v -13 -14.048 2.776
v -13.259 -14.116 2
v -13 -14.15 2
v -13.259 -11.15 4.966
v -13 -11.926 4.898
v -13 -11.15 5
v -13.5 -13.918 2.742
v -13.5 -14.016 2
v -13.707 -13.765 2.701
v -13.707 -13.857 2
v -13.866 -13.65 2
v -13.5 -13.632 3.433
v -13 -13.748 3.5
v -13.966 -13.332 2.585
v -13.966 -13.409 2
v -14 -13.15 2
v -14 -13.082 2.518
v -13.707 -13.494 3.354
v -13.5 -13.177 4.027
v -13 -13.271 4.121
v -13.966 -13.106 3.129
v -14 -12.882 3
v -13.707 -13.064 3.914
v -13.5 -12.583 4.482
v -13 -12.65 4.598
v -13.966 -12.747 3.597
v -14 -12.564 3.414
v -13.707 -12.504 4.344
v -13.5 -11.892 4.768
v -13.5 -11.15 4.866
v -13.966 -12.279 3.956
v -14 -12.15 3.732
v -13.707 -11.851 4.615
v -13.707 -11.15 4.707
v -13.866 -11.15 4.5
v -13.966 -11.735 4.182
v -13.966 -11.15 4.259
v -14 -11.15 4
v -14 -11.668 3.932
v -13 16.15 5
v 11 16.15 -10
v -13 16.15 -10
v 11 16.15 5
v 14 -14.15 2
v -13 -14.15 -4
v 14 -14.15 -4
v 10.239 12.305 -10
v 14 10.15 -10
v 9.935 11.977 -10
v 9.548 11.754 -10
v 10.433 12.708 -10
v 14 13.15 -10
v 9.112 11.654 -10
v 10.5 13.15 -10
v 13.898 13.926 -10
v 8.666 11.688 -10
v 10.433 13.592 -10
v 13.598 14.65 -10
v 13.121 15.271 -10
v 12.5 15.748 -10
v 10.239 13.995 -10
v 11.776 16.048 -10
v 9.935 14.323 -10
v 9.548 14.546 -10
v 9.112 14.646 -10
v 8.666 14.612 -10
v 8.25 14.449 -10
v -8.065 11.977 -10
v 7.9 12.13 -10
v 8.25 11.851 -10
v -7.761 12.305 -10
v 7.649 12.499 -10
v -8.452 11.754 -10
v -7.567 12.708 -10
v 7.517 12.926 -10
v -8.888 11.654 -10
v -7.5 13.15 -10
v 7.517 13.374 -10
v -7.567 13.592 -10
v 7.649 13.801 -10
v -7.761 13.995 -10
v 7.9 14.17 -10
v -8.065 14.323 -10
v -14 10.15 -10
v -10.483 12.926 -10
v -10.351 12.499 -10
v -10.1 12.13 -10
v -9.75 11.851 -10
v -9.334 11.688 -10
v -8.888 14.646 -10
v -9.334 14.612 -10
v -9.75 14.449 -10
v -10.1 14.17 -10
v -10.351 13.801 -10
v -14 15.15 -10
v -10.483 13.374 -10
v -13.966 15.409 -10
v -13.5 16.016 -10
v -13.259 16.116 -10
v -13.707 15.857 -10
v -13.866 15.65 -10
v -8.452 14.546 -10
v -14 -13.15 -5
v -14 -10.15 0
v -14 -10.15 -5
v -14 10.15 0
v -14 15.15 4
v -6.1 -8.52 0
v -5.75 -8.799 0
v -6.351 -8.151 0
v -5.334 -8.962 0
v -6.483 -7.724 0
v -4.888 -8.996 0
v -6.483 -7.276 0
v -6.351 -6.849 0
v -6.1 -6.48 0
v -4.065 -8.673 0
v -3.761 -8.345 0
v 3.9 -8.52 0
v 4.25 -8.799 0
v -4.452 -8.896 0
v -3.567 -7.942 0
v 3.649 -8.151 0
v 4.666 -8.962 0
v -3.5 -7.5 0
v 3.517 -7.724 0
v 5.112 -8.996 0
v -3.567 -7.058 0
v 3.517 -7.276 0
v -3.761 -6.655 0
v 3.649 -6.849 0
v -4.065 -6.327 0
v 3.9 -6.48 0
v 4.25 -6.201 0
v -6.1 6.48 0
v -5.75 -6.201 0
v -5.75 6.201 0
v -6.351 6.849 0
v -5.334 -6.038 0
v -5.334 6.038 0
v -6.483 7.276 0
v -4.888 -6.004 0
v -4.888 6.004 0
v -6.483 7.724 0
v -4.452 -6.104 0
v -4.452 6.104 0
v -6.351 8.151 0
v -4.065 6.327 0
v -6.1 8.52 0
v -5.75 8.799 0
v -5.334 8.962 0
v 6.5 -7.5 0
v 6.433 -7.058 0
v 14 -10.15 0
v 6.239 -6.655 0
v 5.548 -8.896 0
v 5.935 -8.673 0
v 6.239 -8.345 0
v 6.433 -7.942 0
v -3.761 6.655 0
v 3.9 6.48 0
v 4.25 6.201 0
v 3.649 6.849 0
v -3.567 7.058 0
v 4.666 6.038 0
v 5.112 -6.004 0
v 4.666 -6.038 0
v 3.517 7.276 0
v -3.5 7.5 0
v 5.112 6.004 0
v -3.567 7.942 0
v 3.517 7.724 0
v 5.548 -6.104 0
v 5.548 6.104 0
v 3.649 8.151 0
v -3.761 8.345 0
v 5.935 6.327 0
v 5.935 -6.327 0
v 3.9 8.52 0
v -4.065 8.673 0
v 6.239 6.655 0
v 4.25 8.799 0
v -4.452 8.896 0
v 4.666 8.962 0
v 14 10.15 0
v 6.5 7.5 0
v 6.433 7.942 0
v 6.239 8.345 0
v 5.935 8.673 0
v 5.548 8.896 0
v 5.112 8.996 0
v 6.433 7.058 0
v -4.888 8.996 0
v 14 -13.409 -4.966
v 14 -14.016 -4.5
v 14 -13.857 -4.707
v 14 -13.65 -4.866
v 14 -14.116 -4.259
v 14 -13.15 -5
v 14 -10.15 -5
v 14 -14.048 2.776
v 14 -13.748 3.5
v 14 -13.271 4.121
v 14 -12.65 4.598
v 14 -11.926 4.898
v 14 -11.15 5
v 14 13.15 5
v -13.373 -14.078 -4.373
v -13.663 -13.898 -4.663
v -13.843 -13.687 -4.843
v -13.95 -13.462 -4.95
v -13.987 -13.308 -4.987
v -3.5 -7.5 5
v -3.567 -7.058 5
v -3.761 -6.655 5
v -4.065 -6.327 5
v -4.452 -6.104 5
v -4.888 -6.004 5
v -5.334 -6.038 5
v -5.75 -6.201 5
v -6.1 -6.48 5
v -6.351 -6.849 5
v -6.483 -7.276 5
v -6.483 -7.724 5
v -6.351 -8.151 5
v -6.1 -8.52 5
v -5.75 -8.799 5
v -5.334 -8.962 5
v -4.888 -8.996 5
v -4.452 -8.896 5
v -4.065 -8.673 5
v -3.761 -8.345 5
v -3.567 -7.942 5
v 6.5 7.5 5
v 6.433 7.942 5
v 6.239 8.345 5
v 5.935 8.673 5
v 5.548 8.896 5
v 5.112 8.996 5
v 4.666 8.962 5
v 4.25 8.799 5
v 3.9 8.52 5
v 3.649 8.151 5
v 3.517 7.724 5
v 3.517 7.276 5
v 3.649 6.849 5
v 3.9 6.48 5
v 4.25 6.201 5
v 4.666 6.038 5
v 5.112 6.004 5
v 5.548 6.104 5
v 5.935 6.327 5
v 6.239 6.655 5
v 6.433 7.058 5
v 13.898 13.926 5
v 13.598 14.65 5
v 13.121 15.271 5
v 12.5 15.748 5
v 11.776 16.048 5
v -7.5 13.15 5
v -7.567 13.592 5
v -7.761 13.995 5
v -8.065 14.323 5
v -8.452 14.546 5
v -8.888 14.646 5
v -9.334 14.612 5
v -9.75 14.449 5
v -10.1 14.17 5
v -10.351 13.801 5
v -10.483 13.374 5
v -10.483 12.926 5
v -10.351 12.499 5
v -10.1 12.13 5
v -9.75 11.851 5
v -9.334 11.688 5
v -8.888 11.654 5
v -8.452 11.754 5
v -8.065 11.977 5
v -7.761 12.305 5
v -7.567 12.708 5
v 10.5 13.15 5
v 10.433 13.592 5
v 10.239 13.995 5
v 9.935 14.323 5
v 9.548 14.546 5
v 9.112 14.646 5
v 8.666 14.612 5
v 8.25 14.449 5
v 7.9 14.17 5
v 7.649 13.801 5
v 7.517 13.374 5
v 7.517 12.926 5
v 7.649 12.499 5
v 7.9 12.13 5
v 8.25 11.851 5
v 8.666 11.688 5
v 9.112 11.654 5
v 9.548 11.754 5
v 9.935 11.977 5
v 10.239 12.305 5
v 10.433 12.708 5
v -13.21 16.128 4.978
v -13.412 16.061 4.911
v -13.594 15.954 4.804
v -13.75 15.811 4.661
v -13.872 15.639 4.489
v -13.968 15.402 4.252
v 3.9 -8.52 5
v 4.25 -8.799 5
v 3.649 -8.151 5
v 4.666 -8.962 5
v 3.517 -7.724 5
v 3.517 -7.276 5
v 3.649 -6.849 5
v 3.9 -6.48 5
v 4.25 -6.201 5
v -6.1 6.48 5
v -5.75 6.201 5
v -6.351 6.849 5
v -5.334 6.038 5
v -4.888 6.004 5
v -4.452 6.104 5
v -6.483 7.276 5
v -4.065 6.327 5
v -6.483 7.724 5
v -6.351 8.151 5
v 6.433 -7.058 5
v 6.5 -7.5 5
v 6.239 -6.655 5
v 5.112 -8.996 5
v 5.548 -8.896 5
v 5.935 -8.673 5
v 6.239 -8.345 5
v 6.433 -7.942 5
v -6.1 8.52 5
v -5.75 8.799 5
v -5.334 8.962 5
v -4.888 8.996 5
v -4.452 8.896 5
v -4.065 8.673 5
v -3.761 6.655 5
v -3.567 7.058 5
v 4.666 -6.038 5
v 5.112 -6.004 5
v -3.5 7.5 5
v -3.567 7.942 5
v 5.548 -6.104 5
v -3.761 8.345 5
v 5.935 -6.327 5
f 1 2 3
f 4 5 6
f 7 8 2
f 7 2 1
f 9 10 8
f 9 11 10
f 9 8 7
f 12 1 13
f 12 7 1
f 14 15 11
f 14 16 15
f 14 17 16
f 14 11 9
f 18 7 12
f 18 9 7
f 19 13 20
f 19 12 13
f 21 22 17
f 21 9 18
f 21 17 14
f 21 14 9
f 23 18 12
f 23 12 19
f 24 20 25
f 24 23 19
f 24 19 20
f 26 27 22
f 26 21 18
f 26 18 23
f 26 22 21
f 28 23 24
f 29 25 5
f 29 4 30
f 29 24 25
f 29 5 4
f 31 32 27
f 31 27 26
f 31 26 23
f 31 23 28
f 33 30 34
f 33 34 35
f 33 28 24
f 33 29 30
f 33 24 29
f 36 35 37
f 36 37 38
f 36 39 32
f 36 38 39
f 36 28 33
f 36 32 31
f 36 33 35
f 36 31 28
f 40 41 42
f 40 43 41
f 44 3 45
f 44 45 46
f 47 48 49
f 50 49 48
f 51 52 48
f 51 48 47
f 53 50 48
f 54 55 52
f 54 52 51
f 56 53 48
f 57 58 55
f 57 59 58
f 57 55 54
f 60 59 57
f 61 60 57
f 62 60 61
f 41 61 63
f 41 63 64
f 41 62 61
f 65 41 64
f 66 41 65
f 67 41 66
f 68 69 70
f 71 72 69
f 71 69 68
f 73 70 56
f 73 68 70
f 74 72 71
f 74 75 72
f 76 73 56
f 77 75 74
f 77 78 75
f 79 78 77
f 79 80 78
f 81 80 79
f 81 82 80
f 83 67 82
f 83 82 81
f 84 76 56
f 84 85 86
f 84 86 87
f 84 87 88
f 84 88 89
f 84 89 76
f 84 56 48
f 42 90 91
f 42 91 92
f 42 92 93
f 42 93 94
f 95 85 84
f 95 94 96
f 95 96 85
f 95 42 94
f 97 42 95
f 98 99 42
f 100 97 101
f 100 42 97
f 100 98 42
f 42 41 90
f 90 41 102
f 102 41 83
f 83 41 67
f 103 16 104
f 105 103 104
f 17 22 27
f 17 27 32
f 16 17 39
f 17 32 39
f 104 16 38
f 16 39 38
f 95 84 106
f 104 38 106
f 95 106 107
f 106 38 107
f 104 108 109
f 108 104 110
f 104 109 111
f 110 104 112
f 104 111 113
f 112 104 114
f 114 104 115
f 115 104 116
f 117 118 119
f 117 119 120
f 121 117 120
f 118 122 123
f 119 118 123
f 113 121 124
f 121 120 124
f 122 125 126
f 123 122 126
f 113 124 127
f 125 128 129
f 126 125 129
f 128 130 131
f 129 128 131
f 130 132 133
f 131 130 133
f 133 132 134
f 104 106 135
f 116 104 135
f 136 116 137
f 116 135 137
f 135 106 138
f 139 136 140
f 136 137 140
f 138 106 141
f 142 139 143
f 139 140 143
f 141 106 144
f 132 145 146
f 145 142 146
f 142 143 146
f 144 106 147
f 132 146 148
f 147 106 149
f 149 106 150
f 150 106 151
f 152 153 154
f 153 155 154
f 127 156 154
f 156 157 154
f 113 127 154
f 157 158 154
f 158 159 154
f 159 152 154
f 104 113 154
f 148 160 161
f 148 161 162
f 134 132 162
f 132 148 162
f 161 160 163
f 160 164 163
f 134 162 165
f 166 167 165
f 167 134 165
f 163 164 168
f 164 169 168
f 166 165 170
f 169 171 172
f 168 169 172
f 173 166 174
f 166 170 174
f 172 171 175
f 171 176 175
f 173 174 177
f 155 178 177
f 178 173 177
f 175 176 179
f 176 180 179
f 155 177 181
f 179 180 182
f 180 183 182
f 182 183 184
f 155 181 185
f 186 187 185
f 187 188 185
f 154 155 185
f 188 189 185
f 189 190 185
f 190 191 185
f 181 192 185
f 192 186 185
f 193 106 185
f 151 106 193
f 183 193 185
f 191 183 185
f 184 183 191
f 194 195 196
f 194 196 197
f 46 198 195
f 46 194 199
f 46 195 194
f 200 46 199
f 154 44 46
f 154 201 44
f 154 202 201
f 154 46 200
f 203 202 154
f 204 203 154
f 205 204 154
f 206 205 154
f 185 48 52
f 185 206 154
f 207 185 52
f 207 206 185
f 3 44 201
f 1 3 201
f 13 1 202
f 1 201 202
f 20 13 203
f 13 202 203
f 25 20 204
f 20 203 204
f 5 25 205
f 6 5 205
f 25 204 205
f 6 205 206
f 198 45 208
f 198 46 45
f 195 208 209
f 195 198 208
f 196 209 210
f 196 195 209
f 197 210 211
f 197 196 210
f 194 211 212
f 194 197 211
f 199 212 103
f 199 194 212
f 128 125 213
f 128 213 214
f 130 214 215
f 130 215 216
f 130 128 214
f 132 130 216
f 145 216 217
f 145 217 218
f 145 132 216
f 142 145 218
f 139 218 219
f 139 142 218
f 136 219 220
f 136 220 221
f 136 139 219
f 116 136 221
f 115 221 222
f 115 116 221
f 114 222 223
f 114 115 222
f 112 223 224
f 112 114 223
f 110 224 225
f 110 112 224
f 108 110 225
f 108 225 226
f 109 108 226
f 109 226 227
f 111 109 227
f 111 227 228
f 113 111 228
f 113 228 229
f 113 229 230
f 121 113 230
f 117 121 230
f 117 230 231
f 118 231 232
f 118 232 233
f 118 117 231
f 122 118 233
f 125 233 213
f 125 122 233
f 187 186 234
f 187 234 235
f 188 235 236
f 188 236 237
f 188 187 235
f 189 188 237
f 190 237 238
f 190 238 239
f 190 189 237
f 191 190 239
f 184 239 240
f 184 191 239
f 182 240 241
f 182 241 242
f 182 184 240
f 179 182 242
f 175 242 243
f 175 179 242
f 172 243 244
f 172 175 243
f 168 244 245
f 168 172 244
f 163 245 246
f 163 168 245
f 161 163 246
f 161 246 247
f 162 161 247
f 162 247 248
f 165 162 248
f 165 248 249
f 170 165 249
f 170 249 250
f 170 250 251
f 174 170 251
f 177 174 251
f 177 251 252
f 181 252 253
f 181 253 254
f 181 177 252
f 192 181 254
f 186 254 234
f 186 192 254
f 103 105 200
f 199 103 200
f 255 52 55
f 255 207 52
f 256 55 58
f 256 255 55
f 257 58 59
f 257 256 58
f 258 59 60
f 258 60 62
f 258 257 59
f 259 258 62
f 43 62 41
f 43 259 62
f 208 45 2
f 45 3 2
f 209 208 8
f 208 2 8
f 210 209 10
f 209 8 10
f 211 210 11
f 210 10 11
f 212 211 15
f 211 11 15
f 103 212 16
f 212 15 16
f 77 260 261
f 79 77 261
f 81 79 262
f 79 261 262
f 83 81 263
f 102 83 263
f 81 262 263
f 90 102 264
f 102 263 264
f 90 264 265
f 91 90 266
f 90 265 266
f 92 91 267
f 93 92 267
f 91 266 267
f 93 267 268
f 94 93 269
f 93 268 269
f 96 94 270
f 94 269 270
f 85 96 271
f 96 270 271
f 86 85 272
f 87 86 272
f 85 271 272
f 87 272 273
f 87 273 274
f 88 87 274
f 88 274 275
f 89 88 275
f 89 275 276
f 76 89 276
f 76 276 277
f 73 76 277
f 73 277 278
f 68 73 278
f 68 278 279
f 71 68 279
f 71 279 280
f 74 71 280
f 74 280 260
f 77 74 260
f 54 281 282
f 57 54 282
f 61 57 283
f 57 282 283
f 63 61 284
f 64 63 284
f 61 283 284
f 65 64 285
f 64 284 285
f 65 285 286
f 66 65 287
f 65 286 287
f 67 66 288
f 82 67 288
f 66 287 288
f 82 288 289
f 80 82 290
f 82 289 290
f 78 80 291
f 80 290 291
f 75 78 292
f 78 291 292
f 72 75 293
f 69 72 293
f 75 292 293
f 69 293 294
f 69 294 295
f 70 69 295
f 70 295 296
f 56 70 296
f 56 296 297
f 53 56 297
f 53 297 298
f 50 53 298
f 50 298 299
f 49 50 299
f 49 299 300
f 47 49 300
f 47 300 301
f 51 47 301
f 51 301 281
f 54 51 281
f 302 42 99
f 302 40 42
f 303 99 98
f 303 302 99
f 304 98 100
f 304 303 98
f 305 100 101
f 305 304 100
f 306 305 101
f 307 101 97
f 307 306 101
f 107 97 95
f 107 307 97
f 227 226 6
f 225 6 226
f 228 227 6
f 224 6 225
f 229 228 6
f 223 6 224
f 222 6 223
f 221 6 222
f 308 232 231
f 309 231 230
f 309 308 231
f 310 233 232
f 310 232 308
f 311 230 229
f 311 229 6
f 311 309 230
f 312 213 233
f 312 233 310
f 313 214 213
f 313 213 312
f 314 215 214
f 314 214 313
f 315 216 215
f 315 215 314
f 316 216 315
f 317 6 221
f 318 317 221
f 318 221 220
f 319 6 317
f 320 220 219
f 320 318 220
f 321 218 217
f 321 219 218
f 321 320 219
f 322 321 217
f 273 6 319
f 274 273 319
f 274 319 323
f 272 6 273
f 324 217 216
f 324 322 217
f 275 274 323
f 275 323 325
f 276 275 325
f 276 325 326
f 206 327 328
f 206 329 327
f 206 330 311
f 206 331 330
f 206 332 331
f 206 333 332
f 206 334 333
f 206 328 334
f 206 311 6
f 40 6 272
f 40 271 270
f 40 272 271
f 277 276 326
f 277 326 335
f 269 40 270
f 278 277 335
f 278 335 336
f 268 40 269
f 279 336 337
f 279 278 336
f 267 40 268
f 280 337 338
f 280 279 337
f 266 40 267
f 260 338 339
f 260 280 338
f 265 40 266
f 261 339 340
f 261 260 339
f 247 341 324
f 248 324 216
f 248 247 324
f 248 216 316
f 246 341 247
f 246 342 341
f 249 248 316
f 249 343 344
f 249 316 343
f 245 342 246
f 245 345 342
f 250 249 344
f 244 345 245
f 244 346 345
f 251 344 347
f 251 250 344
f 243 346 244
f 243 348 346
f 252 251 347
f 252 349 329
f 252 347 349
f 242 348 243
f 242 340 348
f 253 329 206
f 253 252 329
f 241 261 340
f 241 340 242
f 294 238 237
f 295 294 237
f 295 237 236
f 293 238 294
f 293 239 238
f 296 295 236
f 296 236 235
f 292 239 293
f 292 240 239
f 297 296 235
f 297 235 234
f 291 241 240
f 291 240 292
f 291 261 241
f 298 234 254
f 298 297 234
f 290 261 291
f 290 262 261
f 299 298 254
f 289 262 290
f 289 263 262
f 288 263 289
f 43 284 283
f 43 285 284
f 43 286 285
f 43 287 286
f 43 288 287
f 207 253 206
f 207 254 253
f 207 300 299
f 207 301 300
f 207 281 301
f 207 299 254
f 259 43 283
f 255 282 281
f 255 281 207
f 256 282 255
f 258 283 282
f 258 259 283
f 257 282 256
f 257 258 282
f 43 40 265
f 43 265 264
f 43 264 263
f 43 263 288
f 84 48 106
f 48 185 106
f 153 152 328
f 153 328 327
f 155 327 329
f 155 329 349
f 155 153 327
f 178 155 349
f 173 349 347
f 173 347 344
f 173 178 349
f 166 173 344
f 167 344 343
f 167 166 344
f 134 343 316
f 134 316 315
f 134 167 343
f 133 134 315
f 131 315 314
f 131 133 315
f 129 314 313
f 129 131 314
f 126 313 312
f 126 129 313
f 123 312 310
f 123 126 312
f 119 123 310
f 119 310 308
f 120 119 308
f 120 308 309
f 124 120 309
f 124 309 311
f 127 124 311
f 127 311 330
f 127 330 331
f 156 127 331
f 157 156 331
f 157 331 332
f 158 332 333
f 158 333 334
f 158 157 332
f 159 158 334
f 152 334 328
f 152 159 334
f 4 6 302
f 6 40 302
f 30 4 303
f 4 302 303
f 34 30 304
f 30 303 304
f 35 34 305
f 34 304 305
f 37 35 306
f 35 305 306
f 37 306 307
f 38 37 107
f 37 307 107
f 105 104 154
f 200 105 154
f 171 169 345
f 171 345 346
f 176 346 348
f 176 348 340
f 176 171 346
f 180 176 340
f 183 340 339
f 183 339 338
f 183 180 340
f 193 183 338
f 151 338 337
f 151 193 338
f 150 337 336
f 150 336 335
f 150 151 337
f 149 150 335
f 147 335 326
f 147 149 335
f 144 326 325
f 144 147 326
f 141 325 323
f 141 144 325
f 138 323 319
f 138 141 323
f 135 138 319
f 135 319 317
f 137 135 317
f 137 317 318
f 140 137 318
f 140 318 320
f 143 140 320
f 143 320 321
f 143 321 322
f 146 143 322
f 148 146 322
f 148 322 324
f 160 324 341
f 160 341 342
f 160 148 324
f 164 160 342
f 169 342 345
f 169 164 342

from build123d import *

# Parameters (mm, degrees)
SKETCH_1_W          = 28
SKETCH_1_H          = 20.3
SKETCH_1_R          = 1.5
EXTRUDE_1_DEPTH     = 5
SKETCH_2_W          = 28
SKETCH_2_H          = 6
SKETCH_2_H_2        = 4
EXTRUDE_2_DEPTH     = 10
SKETCH_3_W          = 28
SKETCH_3_H          = 6
EXTRUDE_3_DEPTH     = 5
FILLET_1_R          = 3
FILLET_2_R          = 1
SKETCH_4_R          = 1.5
CUT_EXTRUDE_1_DEPTH = 27.11173108


with BuildPart() as part:
    # 草图1 → 凸台-拉伸1 (new body)
    with BuildSketch(Plane.XY):
        Rectangle(SKETCH_1_W, SKETCH_1_H)
        with Locations((-5, 7.5)):
            Circle(SKETCH_1_R, mode=Mode.SUBTRACT)
        with Locations((5, 7.5)):
            Circle(SKETCH_1_R, mode=Mode.SUBTRACT)
        with Locations((5, -7.5)):
            Circle(SKETCH_1_R, mode=Mode.SUBTRACT)
        with Locations((-5, -7.5)):
            Circle(SKETCH_1_R, mode=Mode.SUBTRACT)
    extrude(amount=EXTRUDE_1_DEPTH)

    # 草图2 → 凸台-拉伸2 (add)
    with BuildSketch(Plane.XY.offset(5)):
        with Locations((0, 13.15)):
            Rectangle(SKETCH_2_W, SKETCH_2_H)
        with Locations((0, -12.15)):
            Rectangle(SKETCH_2_W, SKETCH_2_H_2)
    extrude(amount=-EXTRUDE_2_DEPTH)

    # 草图3 → 凸台-拉伸3 (add)
    with BuildSketch(Plane(origin=(0, 0, -5), x_dir=(-1, 0, 0), z_dir=(0, 0, -1))):
        with Locations((0, 13.15)):
            Rectangle(SKETCH_3_W, SKETCH_3_H)
    extrude(amount=EXTRUDE_3_DEPTH)

    # 圆角1
    fillet_1_edges = [part.edges().sort_by_distance(p)[0] for p in [
        (14, 16.15, -2.5),
        (0, -14.15, 5),
    ]]
    fillet(fillet_1_edges, radius=FILLET_1_R)

    # 圆角2
    fillet_2_edges = [part.edges().sort_by_distance(p)[0] for p in [
        (-14, 2.5, 5),
        (-14, 16.15, -2.5),
        (0, -14.15, -5),
        (-14, -14.15, -1.5),
        (-14, -13.271320344, 4.121320344),
    ]]
    fillet(fillet_2_edges, radius=FILLET_2_R)

    # 草图4 → 切除-拉伸1 (cut, through all)
    with BuildSketch(Plane.XY.offset(5)):
        with Locations((-9, 13.15)):
            Circle(SKETCH_4_R)
        with Locations((9, 13.15)):
            Circle(SKETCH_4_R)
    extrude(amount=-CUT_EXTRUDE_1_DEPTH, mode=Mode.SUBTRACT)


solid = part.part
